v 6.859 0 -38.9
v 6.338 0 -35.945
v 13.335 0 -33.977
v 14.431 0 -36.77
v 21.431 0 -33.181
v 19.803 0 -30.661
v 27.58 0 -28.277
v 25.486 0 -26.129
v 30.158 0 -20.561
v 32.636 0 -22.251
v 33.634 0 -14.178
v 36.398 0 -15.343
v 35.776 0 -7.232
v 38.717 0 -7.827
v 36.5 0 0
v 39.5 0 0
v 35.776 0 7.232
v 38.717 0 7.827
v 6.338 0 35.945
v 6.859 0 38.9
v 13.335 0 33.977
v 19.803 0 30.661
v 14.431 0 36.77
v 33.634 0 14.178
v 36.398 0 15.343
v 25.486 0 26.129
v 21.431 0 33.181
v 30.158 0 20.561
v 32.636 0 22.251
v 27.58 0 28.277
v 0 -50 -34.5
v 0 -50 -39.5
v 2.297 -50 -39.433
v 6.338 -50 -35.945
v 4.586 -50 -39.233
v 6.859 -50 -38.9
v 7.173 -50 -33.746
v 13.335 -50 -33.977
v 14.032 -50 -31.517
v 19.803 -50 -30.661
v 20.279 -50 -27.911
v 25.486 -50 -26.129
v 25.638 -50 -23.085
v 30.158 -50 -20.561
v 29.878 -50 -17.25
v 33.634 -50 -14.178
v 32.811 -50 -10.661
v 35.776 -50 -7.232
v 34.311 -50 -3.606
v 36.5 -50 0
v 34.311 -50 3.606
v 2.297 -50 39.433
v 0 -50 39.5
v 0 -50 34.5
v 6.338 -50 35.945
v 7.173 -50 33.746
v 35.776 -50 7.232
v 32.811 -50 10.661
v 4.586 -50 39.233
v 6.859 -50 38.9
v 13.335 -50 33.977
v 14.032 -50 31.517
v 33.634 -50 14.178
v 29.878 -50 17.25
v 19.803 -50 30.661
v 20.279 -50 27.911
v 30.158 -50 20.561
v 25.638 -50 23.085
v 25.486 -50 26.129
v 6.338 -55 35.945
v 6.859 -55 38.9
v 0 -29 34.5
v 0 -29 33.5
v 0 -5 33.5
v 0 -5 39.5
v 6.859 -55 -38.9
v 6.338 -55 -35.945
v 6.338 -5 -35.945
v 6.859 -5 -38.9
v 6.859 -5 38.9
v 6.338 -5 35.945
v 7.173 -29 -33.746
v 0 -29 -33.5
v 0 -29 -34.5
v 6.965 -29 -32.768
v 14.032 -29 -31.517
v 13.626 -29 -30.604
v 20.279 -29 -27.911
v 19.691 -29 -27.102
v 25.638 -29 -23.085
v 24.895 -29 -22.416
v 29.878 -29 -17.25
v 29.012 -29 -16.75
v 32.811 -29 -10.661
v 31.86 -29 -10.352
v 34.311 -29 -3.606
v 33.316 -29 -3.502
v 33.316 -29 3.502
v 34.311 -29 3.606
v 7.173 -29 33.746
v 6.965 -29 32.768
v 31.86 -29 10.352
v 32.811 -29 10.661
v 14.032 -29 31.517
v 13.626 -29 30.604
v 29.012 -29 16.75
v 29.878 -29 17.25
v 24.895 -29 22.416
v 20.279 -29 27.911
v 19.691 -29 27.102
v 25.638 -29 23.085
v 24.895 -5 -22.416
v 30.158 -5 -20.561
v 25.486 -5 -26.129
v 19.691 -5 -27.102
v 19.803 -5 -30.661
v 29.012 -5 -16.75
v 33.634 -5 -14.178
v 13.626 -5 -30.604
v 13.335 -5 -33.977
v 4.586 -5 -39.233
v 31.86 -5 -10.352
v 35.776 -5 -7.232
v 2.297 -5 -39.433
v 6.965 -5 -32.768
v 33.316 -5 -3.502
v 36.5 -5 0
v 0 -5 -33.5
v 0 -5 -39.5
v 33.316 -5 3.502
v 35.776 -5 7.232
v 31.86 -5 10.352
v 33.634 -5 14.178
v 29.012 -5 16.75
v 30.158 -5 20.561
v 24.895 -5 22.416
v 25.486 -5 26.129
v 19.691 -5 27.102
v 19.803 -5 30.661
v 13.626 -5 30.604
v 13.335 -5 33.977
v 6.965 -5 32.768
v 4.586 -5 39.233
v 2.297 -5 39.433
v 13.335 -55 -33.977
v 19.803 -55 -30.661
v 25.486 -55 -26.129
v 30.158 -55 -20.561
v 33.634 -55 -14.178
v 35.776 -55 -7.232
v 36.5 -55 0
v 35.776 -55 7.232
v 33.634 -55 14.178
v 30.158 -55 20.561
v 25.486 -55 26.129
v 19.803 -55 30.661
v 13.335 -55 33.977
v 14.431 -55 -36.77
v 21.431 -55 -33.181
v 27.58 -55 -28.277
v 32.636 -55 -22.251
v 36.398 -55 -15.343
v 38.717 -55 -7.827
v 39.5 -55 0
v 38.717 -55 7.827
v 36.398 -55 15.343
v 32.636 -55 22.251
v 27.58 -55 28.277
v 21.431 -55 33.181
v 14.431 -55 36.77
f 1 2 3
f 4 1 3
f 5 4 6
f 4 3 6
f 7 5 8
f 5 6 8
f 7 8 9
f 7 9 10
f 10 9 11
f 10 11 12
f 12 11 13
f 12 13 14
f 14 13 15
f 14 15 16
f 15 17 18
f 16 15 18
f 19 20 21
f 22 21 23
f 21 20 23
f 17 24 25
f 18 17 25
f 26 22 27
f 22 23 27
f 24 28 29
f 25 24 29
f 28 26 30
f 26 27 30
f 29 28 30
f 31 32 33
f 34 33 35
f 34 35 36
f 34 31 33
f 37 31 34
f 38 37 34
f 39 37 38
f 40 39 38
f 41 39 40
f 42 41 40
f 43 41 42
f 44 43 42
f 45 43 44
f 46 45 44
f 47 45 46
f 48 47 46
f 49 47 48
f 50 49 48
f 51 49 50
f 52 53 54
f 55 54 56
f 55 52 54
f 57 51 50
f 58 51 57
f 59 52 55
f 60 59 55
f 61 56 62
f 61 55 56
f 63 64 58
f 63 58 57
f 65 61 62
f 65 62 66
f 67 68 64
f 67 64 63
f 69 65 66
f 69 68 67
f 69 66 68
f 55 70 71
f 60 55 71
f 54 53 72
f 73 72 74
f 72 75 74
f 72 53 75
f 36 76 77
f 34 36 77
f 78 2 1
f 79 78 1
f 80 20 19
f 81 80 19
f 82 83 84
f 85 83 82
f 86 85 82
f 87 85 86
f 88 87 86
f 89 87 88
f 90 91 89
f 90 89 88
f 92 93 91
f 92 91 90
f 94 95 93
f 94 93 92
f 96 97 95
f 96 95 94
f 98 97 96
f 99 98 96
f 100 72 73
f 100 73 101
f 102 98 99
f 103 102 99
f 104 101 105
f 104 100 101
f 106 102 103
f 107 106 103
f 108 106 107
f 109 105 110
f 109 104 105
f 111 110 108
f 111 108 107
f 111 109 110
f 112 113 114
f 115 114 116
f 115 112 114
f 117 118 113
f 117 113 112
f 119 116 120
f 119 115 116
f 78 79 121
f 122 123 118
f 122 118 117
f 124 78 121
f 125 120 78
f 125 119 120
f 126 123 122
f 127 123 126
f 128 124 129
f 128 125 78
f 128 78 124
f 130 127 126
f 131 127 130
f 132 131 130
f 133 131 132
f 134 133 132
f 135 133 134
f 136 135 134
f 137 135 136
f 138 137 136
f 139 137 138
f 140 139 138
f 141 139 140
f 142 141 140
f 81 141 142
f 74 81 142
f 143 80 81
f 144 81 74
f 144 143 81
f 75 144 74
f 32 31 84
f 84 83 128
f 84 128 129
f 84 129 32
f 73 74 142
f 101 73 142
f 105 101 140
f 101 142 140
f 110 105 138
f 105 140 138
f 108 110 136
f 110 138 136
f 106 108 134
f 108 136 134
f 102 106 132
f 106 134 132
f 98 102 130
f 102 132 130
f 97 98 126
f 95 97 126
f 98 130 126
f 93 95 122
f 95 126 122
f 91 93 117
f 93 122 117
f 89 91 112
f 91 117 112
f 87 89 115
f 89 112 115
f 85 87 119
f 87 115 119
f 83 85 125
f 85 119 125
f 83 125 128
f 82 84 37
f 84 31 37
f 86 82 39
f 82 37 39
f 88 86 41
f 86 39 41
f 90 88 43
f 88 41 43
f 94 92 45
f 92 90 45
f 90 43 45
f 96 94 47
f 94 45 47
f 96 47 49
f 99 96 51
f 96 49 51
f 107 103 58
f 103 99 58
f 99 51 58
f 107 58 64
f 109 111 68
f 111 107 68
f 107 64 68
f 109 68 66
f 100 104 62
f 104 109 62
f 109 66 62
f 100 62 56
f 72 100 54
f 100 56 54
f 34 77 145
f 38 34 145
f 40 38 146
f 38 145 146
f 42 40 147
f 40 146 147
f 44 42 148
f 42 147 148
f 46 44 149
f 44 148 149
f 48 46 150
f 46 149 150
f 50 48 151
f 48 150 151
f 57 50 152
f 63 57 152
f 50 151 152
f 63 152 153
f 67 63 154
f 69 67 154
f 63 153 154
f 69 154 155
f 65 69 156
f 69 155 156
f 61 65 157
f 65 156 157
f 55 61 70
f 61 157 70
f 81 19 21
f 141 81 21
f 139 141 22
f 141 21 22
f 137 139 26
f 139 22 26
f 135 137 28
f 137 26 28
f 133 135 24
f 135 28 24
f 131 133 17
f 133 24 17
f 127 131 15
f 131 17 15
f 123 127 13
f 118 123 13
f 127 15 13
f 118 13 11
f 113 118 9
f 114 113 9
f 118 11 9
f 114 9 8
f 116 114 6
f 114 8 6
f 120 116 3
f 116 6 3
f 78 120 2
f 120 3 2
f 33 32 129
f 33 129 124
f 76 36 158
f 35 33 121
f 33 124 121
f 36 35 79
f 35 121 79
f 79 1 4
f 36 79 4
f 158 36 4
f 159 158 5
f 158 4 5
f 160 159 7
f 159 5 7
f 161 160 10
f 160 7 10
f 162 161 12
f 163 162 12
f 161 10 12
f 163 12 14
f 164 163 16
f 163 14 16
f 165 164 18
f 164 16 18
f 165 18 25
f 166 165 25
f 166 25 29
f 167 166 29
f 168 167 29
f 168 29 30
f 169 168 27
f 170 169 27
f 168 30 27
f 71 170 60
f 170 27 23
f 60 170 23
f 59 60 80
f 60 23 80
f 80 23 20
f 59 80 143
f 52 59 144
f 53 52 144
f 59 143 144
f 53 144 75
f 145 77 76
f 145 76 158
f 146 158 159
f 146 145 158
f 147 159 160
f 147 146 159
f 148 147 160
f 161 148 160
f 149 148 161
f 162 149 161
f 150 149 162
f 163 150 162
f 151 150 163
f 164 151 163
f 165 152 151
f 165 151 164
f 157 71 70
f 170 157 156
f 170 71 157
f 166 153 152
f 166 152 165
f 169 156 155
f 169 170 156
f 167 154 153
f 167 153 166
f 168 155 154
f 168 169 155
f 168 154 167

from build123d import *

# Parameters (mm, degrees)
F1_DEPTH = 55
F3_DEPTH = 5
F5_DEPTH = 5
F6_R     = 34.5
F6_R_2   = 33.5
F7_DEPTH = 26


with BuildPart() as f1:
    # F0 (on Front) → F1 (new body)
    with BuildSketch(Plane.XZ):
        with BuildLine():
            Line((0, -33.5), (0, -39.5))
            ThreePointArc((0, -39.5), (39.5, 0), (0, 39.5))
            Line((0, 39.5), (0, 33.5))
            ThreePointArc((0, 33.5), (33.5, 0), (0, -33.5))
        make_face()
    extrude(amount=F1_DEPTH)

    # F2 (on face) → F3 (cut)
    with BuildSketch(Plane.XZ.offset(55)):
        with BuildLine():
            Line((6.859103, -38.899906), (6.338158, -35.945483))
            ThreePointArc((6.338158, -35.945483), (36.5, 0), (6.338158, 35.945483))
            Line((6.338158, 35.945483), (6.859103, 38.899906))
            ThreePointArc((6.859103, 38.899906), (3.442652, 39.349691), (0, 39.5))
            Line((0, 39.5), (0, 33.5))
            ThreePointArc((0, 33.5), (33.5, 0), (0, -33.5))
            Line((0, -33.5), (0, -39.5))
            ThreePointArc((0, -39.5), (3.442652, -39.349691), (6.859103, -38.899906))
        make_face()
    extrude(amount=-F3_DEPTH, mode=Mode.SUBTRACT)

    # F4 (on face) → F5 (cut)
    with BuildSketch(Plane(origin=(0, 0, 0), x_dir=(-1, 0, 0), z_dir=(0, 1, 0))):
        with BuildLine():
            Line((-6.859103, 38.899906), (-6.338158, 35.945483))
            ThreePointArc((-6.338158, 35.945483), (-36.5, 0), (-6.338158, -35.945483))
            Line((-6.338158, -35.945483), (-6.859103, -38.899906))
            ThreePointArc((-6.859103, -38.899906), (-3.442652, -39.349691), (0, -39.5))
            Line((0, -39.5), (0, -33.5))
            ThreePointArc((0, -33.5), (-33.5, 0), (0, 33.5))
            Line((0, 33.5), (0, 39.5))
            ThreePointArc((0, 39.5), (-3.442652, 39.349691), (-6.859103, 38.899906))
        make_face()
    extrude(amount=-F5_DEPTH, mode=Mode.SUBTRACT)

    # F6 (on face) → F7 (cut)
    with BuildSketch(Plane.XZ.offset(55)):
        Circle(F6_R)
        Circle(F6_R_2, mode=Mode.SUBTRACT)
    extrude(amount=-F7_DEPTH, mode=Mode.SUBTRACT)


solid = f1.part
